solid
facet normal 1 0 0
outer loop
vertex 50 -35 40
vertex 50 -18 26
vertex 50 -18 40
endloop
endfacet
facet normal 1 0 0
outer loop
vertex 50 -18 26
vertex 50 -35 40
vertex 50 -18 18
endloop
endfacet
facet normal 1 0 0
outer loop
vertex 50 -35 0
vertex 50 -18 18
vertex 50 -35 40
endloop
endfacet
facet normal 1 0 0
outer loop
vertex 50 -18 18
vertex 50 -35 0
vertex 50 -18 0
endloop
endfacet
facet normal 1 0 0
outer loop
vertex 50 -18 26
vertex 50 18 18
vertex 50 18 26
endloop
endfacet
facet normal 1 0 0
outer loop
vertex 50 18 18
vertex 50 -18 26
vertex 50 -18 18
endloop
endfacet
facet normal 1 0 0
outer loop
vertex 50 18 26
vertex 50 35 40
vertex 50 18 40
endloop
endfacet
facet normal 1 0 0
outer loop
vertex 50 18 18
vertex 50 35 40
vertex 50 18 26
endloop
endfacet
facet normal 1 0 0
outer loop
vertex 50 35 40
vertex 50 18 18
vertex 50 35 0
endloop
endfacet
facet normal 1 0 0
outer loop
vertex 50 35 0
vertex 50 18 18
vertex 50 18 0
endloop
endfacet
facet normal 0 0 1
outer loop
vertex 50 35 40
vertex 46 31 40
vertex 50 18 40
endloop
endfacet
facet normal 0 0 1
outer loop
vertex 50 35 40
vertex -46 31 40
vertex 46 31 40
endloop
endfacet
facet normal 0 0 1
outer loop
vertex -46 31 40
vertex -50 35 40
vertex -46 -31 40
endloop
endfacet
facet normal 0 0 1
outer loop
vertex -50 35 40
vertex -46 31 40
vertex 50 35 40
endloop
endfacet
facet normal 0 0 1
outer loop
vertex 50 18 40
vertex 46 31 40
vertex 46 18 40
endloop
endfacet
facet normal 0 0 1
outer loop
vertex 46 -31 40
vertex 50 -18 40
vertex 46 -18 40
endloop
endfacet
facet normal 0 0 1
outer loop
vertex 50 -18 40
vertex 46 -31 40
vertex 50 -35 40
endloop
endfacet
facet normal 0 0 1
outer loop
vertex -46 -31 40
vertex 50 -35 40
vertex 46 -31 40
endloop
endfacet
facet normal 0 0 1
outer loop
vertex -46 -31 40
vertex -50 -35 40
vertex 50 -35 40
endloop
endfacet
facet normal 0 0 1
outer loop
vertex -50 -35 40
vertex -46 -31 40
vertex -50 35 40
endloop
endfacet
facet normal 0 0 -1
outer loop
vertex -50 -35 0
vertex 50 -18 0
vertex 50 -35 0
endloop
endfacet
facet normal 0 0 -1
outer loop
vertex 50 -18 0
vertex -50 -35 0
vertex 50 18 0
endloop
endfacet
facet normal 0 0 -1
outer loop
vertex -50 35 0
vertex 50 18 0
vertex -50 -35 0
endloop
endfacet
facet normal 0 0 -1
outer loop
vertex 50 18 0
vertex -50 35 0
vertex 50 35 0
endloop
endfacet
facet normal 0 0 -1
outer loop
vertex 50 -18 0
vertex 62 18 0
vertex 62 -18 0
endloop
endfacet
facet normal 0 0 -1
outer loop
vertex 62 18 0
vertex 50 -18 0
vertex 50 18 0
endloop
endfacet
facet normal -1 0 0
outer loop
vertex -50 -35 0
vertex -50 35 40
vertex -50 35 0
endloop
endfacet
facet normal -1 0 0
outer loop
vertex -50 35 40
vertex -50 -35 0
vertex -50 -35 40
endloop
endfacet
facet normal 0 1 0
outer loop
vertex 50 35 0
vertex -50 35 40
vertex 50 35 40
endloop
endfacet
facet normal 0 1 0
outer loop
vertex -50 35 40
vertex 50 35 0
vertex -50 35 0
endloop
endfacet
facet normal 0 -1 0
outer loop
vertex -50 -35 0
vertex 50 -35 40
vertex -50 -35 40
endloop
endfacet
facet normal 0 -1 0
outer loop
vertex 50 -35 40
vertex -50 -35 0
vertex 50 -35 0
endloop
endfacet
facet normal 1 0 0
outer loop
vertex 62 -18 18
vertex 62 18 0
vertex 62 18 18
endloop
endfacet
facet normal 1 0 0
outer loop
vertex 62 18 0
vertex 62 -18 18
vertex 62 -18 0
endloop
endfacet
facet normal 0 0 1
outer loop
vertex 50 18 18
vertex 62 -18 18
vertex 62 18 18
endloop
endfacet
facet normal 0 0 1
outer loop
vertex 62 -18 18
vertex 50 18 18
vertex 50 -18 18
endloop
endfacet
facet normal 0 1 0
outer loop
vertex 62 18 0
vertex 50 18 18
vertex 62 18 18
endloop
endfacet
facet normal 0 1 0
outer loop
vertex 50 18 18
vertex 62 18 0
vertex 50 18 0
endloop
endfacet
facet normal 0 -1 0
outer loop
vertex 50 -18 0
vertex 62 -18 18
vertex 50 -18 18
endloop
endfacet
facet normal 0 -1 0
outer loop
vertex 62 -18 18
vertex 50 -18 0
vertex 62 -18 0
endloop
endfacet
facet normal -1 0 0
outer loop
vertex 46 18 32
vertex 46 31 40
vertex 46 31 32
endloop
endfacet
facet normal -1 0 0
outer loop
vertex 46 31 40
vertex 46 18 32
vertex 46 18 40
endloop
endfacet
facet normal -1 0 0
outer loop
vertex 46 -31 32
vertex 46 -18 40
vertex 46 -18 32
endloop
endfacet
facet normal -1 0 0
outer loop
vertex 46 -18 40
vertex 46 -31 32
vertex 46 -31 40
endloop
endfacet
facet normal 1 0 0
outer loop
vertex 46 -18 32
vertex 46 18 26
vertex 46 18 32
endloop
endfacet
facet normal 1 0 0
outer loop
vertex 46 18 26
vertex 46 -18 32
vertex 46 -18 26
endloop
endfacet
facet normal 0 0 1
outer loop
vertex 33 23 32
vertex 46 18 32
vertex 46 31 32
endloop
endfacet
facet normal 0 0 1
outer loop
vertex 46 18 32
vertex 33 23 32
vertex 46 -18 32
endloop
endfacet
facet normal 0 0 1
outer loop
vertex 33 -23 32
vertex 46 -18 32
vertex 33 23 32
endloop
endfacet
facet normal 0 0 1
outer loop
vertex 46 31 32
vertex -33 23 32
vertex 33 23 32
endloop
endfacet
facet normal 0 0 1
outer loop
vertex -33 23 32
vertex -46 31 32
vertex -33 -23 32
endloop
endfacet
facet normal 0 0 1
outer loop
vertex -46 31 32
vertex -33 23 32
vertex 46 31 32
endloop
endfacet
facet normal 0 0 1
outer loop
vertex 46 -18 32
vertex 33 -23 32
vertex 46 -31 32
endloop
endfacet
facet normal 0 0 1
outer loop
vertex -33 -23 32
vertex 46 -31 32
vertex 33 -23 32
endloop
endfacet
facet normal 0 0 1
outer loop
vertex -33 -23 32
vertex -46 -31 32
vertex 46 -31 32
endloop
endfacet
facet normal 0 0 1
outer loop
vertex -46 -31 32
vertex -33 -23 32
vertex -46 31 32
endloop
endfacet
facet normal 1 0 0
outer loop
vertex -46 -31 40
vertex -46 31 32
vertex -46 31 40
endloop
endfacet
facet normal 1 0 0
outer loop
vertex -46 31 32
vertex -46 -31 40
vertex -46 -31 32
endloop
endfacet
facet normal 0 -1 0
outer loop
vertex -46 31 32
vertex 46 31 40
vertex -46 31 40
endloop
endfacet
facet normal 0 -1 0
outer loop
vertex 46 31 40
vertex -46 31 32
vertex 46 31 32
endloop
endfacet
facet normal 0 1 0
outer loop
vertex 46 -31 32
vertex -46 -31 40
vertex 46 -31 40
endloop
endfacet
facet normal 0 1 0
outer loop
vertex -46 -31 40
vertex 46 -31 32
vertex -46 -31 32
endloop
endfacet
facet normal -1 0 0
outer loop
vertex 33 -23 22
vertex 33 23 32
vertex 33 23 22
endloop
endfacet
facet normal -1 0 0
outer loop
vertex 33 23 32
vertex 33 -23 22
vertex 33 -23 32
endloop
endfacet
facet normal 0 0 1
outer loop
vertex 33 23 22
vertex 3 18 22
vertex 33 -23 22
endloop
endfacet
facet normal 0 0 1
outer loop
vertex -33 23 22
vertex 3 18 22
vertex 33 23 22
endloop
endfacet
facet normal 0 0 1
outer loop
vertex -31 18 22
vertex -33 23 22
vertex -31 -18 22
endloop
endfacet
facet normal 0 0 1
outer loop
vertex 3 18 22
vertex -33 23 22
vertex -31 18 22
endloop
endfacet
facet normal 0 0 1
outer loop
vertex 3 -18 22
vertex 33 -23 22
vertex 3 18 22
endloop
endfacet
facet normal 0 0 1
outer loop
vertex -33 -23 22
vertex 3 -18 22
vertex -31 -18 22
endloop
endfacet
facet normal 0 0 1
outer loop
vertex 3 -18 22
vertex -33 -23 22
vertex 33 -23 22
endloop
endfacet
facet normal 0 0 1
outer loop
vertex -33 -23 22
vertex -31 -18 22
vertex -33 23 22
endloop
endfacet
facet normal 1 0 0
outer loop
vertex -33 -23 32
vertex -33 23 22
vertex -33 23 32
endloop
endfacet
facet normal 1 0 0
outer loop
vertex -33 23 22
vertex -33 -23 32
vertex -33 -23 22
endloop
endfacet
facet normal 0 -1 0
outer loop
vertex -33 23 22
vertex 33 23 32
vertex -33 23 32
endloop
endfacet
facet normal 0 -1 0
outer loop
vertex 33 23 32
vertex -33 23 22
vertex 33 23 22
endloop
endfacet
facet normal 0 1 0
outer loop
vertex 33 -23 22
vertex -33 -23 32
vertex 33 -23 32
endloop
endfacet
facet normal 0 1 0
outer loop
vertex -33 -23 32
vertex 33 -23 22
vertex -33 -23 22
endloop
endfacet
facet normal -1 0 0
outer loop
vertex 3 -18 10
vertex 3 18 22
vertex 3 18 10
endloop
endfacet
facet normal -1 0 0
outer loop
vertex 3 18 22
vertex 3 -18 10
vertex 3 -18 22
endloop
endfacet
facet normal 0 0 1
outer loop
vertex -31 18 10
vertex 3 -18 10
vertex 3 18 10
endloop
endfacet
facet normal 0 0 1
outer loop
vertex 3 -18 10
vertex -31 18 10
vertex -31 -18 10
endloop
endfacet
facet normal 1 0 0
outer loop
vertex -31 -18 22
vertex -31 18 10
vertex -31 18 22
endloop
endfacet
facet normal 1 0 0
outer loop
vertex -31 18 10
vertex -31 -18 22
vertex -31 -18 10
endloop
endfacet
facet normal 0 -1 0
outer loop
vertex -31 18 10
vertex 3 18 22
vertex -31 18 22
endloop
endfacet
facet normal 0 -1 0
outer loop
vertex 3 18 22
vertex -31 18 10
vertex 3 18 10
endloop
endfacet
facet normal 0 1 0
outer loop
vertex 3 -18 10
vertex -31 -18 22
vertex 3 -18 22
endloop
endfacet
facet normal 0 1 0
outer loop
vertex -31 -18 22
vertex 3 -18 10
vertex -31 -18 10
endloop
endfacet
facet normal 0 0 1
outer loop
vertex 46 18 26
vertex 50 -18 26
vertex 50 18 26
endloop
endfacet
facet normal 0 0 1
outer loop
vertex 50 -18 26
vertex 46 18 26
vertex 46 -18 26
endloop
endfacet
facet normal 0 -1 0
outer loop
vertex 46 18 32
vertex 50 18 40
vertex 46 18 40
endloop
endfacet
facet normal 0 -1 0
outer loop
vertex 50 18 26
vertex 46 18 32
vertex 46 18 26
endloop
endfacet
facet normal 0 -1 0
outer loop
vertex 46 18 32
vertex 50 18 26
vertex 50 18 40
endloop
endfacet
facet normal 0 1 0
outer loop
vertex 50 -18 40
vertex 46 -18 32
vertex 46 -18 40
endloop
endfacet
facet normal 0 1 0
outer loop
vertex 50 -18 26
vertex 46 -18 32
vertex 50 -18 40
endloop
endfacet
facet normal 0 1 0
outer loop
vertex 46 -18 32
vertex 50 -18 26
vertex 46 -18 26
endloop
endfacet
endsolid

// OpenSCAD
// Main Body Dimensions
body_width = 100;
body_depth = 70;
body_height = 40;

// Cavity Tier 1 (Broad Upper Recess & Rim)
rim_thickness = 4;
tier1_depth = 8;
tier1_width = body_width - (2 * rim_thickness);
tier1_length = body_depth - (2 * rim_thickness);

// Cavity Tier 2 (Intermediate Inset Pocket)
tier2_depth = 18;
tier2_width = 66;
tier2_length = 46;

// Cavity Tier 3 (Deepest Pocket - Asymmetric/Shifted)
tier3_depth = 30;
tier3_width = 34;
tier3_length = 36;
tier3_x_offset = -14;
tier3_y_offset = 0;

// Side Projection Features
proj_width = 12;
proj_length = 36;
proj_height = 18;

// Side Recess Features (Stepped tier directly above projection)
side_recess_width = rim_thickness + 4;
side_recess_length = 36;
side_recess_depth = 14;

// Overlap offset for clean Boolean cuts
eps = 0.01;

// Solid exterior geometry including side projection
module main_solid() {
    // Primary rectangular block
    translate([-body_width/2, -body_depth/2, 0])
        cube([body_width, body_depth, body_height]);

    // Added rectangular solid projection on the +X side
    translate([body_width/2, -proj_length/2, 0])
        cube([proj_width, proj_length, proj_height]);
}

// Subtractive interior cavities and stepped cutaways
module interior_cuts() {
    // Tier 1: Broad upper recess creating the outer rim
    translate([-tier1_width/2, -tier1_length/2, body_height - tier1_depth])
        cube([tier1_width, tier1_length, tier1_depth + eps]);

    // Tier 2: Intermediate centered inset pocket
    translate([-tier2_width/2, -tier2_length/2, body_height - tier2_depth])
        cube([tier2_width, tier2_length, tier2_depth + eps]);

    // Tier 3: Deepest pocket shifted to create uneven interior ledges
    translate([-tier3_width/2 + tier3_x_offset, -tier3_length/2 + tier3_y_offset, body_height - tier3_depth])
        cube([tier3_width, tier3_length, tier3_depth + eps]);

    // Side Recess: Stepped depth tier through the rim above the side projection
    translate([body_width/2 - rim_thickness, -side_recess_length/2, body_height - side_recess_depth])
        cube([side_recess_width + eps, side_recess_length, side_recess_depth + eps]);
}

// Final Model Assembly
difference() {
    main_solid();
    interior_cuts();
}
